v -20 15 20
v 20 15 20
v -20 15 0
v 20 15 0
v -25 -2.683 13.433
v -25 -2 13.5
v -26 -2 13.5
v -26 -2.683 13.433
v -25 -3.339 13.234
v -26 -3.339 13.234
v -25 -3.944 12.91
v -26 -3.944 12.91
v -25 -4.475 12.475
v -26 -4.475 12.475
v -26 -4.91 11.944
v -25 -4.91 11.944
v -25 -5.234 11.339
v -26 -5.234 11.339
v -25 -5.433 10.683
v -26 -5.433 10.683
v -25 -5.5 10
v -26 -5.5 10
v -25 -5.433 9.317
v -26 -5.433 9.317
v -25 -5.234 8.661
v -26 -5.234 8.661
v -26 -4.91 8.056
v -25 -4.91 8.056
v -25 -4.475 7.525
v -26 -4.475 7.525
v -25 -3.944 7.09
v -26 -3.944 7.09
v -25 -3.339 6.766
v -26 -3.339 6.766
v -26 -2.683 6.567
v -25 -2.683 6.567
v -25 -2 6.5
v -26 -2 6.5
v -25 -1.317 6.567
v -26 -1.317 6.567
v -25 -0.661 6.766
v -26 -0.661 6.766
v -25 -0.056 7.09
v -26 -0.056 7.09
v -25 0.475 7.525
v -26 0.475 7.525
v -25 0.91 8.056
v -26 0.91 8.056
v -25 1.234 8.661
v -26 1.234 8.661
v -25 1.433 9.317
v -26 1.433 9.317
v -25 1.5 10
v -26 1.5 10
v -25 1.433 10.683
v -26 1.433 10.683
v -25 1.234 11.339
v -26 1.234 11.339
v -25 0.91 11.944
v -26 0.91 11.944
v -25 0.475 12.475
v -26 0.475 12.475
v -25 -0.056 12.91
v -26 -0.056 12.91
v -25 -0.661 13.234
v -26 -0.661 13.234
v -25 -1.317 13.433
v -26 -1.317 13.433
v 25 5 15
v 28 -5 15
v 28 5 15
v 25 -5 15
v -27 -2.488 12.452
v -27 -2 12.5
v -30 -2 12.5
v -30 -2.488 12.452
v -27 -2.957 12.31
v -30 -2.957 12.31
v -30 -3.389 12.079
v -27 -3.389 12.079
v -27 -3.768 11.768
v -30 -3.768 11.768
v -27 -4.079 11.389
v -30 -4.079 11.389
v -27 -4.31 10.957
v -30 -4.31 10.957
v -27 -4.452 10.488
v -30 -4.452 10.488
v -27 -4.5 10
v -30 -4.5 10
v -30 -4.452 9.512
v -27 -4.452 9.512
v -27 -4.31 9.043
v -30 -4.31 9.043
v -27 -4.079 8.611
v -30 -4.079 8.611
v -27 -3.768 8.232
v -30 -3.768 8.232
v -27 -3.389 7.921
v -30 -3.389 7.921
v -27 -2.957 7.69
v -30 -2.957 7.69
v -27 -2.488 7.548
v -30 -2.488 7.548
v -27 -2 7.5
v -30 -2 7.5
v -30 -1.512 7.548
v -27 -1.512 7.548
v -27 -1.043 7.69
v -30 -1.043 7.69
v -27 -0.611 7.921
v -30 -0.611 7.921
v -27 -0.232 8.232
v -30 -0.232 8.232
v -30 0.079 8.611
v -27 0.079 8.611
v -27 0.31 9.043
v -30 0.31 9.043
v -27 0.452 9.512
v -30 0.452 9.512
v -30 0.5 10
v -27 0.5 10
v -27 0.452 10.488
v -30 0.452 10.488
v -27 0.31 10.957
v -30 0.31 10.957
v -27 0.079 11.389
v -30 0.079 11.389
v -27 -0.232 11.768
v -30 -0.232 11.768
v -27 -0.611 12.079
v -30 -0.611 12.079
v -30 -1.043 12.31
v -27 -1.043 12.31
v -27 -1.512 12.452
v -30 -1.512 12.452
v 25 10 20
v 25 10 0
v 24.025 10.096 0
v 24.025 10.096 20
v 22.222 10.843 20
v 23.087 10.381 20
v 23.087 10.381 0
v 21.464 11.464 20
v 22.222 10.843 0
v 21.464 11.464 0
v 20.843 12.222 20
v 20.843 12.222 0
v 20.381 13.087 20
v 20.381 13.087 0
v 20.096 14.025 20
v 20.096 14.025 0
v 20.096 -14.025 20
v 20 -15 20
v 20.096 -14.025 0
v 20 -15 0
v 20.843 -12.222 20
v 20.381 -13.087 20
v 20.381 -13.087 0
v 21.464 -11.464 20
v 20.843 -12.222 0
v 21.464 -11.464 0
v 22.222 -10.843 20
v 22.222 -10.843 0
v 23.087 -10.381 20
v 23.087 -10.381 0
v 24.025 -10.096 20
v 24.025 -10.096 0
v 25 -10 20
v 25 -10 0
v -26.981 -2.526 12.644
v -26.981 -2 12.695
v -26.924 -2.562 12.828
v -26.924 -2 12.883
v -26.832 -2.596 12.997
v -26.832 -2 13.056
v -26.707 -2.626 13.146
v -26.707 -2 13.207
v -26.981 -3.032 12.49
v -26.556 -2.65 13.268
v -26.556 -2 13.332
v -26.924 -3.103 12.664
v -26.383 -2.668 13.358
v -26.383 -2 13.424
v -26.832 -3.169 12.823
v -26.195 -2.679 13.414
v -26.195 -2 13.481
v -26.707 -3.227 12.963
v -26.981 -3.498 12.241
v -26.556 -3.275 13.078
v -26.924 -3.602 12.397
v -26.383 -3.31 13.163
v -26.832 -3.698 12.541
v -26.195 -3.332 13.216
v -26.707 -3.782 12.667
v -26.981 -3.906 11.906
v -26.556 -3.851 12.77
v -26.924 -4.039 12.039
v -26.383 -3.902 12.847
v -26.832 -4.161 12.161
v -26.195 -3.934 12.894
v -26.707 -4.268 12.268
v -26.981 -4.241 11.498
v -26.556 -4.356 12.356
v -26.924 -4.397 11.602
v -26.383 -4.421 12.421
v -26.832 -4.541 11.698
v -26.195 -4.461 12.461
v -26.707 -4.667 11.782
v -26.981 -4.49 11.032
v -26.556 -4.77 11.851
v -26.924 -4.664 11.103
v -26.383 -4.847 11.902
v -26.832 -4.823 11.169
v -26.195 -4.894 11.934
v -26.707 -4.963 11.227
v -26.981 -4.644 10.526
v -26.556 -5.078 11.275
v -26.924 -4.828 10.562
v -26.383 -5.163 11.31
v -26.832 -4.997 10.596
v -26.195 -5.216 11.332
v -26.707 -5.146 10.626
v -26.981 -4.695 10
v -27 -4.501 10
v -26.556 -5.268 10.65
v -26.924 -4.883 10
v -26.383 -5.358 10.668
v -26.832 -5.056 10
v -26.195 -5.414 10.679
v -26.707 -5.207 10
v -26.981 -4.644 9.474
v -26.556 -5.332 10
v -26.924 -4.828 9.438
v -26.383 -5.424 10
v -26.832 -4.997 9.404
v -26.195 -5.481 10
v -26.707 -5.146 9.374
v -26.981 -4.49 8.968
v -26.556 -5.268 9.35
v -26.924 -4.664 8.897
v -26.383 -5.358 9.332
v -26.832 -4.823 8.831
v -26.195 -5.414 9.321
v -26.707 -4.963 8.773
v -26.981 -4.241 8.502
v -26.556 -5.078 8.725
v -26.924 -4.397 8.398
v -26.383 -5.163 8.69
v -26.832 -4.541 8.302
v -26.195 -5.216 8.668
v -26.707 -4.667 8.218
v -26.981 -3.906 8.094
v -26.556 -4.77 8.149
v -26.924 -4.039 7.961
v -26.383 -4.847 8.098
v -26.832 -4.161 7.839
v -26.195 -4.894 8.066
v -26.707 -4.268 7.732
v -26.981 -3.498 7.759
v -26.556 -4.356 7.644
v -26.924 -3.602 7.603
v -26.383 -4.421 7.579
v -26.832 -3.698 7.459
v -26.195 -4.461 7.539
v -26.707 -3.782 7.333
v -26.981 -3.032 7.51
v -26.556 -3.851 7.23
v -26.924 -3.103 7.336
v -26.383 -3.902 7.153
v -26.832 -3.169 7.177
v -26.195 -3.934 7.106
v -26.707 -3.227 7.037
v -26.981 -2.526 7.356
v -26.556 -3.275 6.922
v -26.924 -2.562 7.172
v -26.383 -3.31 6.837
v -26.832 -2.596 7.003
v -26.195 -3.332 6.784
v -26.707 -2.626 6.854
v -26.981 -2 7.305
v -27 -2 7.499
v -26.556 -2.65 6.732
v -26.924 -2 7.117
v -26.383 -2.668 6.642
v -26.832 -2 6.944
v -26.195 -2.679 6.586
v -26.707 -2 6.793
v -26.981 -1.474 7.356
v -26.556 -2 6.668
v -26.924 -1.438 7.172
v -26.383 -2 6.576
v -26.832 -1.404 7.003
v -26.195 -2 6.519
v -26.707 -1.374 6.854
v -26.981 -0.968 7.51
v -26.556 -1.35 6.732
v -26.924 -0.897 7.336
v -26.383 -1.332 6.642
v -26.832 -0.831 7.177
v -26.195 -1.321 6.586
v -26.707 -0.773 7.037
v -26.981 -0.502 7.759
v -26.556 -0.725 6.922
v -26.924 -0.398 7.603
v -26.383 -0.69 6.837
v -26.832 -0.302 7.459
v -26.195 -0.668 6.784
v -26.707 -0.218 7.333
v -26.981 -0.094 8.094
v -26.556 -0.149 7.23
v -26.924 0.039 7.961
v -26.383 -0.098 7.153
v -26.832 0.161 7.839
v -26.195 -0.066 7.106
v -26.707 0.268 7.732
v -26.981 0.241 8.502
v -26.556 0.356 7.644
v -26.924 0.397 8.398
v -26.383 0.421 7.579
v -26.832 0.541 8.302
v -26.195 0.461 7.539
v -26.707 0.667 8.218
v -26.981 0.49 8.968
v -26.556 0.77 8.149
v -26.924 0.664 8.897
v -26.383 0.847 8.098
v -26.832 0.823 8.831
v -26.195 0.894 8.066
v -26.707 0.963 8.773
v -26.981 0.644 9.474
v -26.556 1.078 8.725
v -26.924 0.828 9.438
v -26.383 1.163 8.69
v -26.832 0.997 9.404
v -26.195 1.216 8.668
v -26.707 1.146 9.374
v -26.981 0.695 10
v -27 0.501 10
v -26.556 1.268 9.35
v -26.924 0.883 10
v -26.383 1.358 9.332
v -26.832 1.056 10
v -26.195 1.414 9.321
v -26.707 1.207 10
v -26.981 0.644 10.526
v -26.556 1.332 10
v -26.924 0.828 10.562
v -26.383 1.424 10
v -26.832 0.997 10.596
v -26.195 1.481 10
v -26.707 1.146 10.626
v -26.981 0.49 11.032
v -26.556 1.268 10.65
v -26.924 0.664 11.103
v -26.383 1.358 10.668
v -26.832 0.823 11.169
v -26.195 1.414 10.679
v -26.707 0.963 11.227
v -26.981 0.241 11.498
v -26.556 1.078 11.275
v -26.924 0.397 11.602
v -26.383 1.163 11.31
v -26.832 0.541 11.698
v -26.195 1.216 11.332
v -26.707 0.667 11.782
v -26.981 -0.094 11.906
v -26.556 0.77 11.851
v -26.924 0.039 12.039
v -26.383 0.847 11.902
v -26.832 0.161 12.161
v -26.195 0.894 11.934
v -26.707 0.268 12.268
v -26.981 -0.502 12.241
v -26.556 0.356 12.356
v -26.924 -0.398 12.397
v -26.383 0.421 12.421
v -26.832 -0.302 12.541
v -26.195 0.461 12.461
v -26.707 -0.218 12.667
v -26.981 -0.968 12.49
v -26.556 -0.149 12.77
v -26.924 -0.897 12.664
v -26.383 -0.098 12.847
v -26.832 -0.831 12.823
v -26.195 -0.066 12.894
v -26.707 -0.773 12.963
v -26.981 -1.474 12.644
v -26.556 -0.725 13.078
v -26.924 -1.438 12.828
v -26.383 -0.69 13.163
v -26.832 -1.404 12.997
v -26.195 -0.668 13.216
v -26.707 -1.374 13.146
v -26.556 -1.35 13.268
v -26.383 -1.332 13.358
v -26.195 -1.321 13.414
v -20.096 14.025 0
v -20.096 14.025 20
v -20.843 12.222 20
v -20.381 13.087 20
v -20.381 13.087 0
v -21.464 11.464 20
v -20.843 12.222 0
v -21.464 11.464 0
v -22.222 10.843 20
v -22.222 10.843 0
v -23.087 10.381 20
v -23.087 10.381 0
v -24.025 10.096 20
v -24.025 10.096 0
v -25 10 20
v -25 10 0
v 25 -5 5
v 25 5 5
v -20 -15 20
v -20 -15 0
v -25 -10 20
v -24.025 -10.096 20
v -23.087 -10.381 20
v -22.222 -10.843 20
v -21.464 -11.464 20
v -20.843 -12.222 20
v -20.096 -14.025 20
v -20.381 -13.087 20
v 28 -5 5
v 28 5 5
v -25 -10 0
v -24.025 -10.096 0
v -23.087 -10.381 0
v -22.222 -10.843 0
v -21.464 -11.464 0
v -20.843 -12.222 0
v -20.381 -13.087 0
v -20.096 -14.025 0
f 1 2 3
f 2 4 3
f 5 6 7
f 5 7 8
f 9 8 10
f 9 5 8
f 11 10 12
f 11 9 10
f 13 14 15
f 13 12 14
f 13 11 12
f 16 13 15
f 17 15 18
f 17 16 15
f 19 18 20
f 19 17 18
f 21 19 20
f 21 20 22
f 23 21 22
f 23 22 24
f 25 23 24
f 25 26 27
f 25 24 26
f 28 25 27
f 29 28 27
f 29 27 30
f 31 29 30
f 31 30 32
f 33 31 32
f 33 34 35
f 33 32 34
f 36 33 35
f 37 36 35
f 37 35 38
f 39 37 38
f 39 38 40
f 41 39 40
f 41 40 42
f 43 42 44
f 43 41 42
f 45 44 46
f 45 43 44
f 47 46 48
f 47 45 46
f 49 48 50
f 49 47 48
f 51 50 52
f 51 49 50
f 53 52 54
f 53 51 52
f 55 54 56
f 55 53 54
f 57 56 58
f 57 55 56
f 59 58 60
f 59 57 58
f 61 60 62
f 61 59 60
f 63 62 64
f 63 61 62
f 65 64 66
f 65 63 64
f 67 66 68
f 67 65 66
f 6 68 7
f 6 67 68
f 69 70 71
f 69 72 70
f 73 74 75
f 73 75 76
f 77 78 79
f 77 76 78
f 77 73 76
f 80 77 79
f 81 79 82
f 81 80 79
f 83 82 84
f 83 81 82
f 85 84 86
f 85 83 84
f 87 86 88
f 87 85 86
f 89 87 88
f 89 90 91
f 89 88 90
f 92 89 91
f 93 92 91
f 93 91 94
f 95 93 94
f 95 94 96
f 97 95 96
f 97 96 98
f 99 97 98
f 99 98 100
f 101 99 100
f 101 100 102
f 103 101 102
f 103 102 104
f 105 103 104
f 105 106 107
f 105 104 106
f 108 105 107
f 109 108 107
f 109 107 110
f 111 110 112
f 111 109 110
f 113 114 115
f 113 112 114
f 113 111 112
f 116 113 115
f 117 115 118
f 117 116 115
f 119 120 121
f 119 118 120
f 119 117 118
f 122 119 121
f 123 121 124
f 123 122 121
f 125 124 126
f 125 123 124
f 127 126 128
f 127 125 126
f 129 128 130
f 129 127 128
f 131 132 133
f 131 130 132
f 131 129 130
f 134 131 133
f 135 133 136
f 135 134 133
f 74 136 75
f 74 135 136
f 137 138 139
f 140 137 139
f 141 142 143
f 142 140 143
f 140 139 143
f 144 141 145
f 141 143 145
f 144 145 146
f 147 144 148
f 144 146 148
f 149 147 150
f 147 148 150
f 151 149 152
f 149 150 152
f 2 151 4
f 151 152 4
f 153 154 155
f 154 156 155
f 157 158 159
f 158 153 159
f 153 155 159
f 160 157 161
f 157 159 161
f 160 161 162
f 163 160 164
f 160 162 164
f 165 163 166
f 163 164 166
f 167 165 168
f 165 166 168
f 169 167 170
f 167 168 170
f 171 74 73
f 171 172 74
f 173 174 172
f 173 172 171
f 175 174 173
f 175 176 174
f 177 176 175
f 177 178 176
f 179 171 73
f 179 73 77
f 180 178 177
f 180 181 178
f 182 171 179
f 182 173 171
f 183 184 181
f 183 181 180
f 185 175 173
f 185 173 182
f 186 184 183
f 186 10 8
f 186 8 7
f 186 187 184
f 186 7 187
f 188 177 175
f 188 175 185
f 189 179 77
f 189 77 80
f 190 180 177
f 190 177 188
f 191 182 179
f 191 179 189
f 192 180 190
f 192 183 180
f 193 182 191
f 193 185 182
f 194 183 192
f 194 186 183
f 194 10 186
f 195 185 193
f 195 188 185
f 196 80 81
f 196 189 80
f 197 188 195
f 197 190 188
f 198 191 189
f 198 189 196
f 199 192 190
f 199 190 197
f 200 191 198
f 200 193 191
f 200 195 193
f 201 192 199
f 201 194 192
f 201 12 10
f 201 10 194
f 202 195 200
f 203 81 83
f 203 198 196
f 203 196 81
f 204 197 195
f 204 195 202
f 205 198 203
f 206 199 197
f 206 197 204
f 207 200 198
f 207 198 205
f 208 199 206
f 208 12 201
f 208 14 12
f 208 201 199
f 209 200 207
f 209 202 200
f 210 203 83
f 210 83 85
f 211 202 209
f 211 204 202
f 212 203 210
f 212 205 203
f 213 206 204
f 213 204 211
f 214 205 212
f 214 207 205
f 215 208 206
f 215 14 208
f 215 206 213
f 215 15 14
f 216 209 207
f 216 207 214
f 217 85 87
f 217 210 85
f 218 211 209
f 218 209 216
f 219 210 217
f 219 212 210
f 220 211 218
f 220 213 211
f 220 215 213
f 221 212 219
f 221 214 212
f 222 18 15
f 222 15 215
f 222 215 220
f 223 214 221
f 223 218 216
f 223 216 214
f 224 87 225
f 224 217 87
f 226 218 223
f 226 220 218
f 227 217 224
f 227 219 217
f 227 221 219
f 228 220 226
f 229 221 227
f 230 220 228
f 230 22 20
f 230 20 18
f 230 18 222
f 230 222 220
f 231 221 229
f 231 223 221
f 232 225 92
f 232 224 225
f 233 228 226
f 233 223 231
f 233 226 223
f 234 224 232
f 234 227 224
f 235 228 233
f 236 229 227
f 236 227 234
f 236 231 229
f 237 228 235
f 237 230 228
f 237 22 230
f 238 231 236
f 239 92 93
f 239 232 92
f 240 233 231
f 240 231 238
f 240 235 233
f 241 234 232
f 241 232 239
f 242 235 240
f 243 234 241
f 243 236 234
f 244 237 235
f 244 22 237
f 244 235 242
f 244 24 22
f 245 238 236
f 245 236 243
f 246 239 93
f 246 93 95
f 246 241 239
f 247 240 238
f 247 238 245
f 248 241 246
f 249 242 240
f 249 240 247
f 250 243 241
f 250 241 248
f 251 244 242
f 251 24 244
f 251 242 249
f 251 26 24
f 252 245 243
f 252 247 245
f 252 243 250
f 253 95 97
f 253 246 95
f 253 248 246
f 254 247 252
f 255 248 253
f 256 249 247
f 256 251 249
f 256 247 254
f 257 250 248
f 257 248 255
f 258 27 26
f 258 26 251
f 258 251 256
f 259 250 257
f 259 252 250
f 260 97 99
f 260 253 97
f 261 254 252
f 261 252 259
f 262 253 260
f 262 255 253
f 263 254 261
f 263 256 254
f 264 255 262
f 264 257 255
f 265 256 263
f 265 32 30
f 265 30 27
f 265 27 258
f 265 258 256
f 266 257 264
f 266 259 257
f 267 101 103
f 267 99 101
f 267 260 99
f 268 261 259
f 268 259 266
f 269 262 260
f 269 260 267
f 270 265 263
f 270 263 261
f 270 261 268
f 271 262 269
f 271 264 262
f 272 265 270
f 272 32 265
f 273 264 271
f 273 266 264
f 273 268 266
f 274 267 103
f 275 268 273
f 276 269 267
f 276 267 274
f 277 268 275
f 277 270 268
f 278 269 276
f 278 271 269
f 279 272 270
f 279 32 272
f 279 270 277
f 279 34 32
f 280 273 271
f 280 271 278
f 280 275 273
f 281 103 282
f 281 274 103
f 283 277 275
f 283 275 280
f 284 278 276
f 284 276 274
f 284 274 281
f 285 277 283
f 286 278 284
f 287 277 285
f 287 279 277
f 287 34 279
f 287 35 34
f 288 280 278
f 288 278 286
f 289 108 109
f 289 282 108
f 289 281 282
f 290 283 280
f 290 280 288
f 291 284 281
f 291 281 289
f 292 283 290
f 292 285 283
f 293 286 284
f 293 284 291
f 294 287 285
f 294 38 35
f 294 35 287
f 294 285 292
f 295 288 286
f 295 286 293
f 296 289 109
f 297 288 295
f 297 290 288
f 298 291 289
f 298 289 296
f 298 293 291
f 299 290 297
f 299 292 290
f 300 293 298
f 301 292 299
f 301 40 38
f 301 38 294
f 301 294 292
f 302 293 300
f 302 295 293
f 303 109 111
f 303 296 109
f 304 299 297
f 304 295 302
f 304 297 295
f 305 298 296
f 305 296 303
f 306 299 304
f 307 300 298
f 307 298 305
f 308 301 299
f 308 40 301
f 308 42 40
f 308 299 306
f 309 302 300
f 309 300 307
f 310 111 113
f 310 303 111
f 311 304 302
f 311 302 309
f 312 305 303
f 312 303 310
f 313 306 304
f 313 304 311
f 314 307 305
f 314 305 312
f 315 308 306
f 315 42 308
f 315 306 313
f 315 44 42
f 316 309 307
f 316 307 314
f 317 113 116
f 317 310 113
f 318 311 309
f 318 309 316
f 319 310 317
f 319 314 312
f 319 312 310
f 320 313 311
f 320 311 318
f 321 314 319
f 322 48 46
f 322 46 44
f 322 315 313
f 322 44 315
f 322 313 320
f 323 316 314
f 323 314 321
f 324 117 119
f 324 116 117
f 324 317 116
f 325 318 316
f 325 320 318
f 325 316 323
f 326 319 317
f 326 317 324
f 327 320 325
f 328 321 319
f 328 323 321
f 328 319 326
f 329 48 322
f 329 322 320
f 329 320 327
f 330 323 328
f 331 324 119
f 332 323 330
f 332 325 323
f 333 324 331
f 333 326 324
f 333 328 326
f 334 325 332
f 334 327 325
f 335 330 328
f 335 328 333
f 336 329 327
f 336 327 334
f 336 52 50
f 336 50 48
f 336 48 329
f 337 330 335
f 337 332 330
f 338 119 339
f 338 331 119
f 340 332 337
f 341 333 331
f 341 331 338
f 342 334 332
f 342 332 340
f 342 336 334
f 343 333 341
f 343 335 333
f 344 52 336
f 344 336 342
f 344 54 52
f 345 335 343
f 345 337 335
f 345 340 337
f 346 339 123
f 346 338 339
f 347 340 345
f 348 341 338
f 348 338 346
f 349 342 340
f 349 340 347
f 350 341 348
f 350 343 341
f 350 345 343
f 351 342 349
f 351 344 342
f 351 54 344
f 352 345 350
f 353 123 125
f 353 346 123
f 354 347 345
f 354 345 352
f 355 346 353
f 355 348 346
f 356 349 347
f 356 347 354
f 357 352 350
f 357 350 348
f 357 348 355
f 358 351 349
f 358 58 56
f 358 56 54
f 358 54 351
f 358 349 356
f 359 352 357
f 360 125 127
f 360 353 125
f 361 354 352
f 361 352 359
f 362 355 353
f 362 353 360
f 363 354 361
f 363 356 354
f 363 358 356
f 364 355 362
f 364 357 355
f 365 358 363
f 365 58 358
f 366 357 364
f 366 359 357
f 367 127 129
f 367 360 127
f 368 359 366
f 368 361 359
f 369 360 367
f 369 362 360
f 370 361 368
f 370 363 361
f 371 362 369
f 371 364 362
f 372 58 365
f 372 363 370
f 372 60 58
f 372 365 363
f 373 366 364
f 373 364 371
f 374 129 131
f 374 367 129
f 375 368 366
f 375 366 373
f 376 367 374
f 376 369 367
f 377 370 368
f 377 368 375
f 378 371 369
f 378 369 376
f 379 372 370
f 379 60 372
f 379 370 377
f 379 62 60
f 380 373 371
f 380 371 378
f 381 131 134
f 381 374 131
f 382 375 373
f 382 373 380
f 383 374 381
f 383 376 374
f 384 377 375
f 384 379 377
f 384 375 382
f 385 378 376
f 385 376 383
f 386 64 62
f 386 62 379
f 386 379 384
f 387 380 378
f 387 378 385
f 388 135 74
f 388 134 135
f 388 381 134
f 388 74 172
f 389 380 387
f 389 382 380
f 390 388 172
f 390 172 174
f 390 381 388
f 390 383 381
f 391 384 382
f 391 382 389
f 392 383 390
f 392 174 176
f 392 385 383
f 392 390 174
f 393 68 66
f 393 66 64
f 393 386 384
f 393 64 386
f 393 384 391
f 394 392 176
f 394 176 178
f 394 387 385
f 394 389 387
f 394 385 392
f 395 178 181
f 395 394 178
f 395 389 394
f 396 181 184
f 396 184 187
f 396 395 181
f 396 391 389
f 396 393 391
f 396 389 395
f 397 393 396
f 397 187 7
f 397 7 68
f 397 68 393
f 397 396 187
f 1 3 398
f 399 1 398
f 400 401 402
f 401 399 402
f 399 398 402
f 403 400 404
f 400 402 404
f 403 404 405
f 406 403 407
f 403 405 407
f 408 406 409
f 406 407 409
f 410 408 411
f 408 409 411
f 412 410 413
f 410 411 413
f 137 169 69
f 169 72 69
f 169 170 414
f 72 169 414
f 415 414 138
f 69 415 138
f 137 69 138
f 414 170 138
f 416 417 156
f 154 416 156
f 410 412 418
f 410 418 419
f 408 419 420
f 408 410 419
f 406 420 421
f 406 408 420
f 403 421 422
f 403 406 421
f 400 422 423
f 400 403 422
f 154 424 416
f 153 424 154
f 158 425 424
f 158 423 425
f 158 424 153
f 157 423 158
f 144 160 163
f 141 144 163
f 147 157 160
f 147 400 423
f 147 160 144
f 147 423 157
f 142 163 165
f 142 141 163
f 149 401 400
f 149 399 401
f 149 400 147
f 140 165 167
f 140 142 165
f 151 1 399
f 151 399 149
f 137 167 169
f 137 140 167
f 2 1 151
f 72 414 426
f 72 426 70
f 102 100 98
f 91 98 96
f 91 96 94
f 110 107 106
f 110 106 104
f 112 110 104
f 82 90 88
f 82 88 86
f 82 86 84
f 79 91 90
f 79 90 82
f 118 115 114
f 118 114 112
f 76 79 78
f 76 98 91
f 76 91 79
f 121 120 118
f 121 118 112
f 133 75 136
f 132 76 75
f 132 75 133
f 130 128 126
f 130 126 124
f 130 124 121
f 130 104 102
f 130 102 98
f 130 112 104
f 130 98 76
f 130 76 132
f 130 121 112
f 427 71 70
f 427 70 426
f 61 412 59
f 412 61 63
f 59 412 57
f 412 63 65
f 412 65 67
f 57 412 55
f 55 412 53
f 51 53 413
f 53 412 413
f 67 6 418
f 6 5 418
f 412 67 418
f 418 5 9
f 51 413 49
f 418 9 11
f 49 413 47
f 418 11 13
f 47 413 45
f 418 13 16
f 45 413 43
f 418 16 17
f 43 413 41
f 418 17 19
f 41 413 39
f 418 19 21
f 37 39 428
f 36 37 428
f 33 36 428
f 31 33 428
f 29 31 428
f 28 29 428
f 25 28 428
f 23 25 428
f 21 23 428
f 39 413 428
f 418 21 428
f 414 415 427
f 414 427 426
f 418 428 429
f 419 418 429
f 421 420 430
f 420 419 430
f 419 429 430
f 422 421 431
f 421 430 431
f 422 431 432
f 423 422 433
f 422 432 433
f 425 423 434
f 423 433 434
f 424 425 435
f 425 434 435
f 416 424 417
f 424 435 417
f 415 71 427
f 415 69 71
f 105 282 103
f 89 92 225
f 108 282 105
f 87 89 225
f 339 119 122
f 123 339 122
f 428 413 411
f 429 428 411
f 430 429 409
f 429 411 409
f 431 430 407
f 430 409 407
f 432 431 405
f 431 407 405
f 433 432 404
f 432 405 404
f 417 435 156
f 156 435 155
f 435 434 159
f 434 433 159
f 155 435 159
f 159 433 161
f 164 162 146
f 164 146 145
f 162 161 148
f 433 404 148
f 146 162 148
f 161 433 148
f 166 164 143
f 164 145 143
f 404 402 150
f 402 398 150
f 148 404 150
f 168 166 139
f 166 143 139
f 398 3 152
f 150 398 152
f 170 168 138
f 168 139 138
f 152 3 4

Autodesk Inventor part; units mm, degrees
ref_plane "YZ Plane" through (0, 0, 0) normal (1, 0, 0) x (0, 1, 0)
ref_plane "XZ Plane" through (0, 0, 0) normal (0, 1, 0) x (-1, 0, 0)
ref_plane "XY Plane" through (0, 0, 0) normal (0, 0, 1) x (1, 0, 0)
sketch "Esboço1" plane through (0, 0, 0) normal (0, 0, 1) x (1, 0, 0)
  line L0 (-20, -15) -> (20, -15)
  line L1 (25, -10) -> (25, 10)
  line L2 (20, 15) -> (-20, 15)
  line L3 (-25, 10) -> (-25, -10)
  line L4 (-25, -15) -> (25, 15) construction
  line L5 (10.842, 0) -> (-10.842, 0) construction
  line L6 (0, 2.6199) -> (0, -2.6199) construction
  line L7 (1.3987, 0) -> (-1.3987, 0) construction
  arc A0 (20, 15) -> (25, 10) centre (25, 15) ccw
  arc A1 (25, -10) -> (20, -15) centre (25, -15) ccw
  arc A2 (-25, 10) -> (-20, 15) centre (-25, 15) ccw
  arc A3 (-20, -15) -> (-25, -10) centre (-25, -15) ccw
  point P0 (0, 0)
  dimension "d0" = 30
  dimension "d1" = 50
  dimension "d22" = 10
  dimension "d23" = 5
  dimension "d24" = 5
extrude "Extrusão1" add sketch "Esboço1" along normal blind 20
sketch "Esboço2" plane through (-25, -10, 0) normal (-1, 0, 0) x (0, 0, 1)
  circle A0 centre (10, 8) radius 2.5
  line L0 (20, 20) -> (20, 0) projected
  line L1 (0, 0) -> (20, 0) projected
  circle A1 centre (10, 8) radius 3.5
  line L2 (10, 0) -> (10, 11.9886) construction
  line L3 (0, -5) -> (20, -5) projected
  point P0 (0, 10)
  dimension "d10" = 1
  dimension "d25" = 5
  dimension "d27" = 8
extrude "Extrusão2" add sketch "Esboço2" along normal blind 2
extrude "Extrusão3" add sketch "Esboço2" along normal blind 5 contours A0
fillet "Arredondamento1" radius 1 1 edges at (-27, -2, 6.5)
thread "Rosca1" size "M2x0.4" class "6g" standard "ANSI Metric M Profile" full length
sketch "Esboço5" plane through (25, -10, 0) normal (1, 0, 0) x (0, 0, -1)
  line L0 (-20, 20) -> (0, 20) projected
  line L1 (0, 20) -> (0, 0) projected
  line L2 (0, 0) -> (-20, 0) projected
  line L3 (-20, 0) -> (-20, 20) projected
  line L4 (-15, 15) -> (-5, 15)
  line L5 (-5, 15) -> (-5, 5)
  line L6 (-5, 5) -> (-15, 5)
  line L7 (-15, 5) -> (-15, 15)
  point P0 (0, 10)
  dimension "d28" = 5
extrude "Extrusão4" add sketch "Esboço5" along normal blind 3 contours L4 L5 L6 L7
properties part number "receptor ftth fibra"
